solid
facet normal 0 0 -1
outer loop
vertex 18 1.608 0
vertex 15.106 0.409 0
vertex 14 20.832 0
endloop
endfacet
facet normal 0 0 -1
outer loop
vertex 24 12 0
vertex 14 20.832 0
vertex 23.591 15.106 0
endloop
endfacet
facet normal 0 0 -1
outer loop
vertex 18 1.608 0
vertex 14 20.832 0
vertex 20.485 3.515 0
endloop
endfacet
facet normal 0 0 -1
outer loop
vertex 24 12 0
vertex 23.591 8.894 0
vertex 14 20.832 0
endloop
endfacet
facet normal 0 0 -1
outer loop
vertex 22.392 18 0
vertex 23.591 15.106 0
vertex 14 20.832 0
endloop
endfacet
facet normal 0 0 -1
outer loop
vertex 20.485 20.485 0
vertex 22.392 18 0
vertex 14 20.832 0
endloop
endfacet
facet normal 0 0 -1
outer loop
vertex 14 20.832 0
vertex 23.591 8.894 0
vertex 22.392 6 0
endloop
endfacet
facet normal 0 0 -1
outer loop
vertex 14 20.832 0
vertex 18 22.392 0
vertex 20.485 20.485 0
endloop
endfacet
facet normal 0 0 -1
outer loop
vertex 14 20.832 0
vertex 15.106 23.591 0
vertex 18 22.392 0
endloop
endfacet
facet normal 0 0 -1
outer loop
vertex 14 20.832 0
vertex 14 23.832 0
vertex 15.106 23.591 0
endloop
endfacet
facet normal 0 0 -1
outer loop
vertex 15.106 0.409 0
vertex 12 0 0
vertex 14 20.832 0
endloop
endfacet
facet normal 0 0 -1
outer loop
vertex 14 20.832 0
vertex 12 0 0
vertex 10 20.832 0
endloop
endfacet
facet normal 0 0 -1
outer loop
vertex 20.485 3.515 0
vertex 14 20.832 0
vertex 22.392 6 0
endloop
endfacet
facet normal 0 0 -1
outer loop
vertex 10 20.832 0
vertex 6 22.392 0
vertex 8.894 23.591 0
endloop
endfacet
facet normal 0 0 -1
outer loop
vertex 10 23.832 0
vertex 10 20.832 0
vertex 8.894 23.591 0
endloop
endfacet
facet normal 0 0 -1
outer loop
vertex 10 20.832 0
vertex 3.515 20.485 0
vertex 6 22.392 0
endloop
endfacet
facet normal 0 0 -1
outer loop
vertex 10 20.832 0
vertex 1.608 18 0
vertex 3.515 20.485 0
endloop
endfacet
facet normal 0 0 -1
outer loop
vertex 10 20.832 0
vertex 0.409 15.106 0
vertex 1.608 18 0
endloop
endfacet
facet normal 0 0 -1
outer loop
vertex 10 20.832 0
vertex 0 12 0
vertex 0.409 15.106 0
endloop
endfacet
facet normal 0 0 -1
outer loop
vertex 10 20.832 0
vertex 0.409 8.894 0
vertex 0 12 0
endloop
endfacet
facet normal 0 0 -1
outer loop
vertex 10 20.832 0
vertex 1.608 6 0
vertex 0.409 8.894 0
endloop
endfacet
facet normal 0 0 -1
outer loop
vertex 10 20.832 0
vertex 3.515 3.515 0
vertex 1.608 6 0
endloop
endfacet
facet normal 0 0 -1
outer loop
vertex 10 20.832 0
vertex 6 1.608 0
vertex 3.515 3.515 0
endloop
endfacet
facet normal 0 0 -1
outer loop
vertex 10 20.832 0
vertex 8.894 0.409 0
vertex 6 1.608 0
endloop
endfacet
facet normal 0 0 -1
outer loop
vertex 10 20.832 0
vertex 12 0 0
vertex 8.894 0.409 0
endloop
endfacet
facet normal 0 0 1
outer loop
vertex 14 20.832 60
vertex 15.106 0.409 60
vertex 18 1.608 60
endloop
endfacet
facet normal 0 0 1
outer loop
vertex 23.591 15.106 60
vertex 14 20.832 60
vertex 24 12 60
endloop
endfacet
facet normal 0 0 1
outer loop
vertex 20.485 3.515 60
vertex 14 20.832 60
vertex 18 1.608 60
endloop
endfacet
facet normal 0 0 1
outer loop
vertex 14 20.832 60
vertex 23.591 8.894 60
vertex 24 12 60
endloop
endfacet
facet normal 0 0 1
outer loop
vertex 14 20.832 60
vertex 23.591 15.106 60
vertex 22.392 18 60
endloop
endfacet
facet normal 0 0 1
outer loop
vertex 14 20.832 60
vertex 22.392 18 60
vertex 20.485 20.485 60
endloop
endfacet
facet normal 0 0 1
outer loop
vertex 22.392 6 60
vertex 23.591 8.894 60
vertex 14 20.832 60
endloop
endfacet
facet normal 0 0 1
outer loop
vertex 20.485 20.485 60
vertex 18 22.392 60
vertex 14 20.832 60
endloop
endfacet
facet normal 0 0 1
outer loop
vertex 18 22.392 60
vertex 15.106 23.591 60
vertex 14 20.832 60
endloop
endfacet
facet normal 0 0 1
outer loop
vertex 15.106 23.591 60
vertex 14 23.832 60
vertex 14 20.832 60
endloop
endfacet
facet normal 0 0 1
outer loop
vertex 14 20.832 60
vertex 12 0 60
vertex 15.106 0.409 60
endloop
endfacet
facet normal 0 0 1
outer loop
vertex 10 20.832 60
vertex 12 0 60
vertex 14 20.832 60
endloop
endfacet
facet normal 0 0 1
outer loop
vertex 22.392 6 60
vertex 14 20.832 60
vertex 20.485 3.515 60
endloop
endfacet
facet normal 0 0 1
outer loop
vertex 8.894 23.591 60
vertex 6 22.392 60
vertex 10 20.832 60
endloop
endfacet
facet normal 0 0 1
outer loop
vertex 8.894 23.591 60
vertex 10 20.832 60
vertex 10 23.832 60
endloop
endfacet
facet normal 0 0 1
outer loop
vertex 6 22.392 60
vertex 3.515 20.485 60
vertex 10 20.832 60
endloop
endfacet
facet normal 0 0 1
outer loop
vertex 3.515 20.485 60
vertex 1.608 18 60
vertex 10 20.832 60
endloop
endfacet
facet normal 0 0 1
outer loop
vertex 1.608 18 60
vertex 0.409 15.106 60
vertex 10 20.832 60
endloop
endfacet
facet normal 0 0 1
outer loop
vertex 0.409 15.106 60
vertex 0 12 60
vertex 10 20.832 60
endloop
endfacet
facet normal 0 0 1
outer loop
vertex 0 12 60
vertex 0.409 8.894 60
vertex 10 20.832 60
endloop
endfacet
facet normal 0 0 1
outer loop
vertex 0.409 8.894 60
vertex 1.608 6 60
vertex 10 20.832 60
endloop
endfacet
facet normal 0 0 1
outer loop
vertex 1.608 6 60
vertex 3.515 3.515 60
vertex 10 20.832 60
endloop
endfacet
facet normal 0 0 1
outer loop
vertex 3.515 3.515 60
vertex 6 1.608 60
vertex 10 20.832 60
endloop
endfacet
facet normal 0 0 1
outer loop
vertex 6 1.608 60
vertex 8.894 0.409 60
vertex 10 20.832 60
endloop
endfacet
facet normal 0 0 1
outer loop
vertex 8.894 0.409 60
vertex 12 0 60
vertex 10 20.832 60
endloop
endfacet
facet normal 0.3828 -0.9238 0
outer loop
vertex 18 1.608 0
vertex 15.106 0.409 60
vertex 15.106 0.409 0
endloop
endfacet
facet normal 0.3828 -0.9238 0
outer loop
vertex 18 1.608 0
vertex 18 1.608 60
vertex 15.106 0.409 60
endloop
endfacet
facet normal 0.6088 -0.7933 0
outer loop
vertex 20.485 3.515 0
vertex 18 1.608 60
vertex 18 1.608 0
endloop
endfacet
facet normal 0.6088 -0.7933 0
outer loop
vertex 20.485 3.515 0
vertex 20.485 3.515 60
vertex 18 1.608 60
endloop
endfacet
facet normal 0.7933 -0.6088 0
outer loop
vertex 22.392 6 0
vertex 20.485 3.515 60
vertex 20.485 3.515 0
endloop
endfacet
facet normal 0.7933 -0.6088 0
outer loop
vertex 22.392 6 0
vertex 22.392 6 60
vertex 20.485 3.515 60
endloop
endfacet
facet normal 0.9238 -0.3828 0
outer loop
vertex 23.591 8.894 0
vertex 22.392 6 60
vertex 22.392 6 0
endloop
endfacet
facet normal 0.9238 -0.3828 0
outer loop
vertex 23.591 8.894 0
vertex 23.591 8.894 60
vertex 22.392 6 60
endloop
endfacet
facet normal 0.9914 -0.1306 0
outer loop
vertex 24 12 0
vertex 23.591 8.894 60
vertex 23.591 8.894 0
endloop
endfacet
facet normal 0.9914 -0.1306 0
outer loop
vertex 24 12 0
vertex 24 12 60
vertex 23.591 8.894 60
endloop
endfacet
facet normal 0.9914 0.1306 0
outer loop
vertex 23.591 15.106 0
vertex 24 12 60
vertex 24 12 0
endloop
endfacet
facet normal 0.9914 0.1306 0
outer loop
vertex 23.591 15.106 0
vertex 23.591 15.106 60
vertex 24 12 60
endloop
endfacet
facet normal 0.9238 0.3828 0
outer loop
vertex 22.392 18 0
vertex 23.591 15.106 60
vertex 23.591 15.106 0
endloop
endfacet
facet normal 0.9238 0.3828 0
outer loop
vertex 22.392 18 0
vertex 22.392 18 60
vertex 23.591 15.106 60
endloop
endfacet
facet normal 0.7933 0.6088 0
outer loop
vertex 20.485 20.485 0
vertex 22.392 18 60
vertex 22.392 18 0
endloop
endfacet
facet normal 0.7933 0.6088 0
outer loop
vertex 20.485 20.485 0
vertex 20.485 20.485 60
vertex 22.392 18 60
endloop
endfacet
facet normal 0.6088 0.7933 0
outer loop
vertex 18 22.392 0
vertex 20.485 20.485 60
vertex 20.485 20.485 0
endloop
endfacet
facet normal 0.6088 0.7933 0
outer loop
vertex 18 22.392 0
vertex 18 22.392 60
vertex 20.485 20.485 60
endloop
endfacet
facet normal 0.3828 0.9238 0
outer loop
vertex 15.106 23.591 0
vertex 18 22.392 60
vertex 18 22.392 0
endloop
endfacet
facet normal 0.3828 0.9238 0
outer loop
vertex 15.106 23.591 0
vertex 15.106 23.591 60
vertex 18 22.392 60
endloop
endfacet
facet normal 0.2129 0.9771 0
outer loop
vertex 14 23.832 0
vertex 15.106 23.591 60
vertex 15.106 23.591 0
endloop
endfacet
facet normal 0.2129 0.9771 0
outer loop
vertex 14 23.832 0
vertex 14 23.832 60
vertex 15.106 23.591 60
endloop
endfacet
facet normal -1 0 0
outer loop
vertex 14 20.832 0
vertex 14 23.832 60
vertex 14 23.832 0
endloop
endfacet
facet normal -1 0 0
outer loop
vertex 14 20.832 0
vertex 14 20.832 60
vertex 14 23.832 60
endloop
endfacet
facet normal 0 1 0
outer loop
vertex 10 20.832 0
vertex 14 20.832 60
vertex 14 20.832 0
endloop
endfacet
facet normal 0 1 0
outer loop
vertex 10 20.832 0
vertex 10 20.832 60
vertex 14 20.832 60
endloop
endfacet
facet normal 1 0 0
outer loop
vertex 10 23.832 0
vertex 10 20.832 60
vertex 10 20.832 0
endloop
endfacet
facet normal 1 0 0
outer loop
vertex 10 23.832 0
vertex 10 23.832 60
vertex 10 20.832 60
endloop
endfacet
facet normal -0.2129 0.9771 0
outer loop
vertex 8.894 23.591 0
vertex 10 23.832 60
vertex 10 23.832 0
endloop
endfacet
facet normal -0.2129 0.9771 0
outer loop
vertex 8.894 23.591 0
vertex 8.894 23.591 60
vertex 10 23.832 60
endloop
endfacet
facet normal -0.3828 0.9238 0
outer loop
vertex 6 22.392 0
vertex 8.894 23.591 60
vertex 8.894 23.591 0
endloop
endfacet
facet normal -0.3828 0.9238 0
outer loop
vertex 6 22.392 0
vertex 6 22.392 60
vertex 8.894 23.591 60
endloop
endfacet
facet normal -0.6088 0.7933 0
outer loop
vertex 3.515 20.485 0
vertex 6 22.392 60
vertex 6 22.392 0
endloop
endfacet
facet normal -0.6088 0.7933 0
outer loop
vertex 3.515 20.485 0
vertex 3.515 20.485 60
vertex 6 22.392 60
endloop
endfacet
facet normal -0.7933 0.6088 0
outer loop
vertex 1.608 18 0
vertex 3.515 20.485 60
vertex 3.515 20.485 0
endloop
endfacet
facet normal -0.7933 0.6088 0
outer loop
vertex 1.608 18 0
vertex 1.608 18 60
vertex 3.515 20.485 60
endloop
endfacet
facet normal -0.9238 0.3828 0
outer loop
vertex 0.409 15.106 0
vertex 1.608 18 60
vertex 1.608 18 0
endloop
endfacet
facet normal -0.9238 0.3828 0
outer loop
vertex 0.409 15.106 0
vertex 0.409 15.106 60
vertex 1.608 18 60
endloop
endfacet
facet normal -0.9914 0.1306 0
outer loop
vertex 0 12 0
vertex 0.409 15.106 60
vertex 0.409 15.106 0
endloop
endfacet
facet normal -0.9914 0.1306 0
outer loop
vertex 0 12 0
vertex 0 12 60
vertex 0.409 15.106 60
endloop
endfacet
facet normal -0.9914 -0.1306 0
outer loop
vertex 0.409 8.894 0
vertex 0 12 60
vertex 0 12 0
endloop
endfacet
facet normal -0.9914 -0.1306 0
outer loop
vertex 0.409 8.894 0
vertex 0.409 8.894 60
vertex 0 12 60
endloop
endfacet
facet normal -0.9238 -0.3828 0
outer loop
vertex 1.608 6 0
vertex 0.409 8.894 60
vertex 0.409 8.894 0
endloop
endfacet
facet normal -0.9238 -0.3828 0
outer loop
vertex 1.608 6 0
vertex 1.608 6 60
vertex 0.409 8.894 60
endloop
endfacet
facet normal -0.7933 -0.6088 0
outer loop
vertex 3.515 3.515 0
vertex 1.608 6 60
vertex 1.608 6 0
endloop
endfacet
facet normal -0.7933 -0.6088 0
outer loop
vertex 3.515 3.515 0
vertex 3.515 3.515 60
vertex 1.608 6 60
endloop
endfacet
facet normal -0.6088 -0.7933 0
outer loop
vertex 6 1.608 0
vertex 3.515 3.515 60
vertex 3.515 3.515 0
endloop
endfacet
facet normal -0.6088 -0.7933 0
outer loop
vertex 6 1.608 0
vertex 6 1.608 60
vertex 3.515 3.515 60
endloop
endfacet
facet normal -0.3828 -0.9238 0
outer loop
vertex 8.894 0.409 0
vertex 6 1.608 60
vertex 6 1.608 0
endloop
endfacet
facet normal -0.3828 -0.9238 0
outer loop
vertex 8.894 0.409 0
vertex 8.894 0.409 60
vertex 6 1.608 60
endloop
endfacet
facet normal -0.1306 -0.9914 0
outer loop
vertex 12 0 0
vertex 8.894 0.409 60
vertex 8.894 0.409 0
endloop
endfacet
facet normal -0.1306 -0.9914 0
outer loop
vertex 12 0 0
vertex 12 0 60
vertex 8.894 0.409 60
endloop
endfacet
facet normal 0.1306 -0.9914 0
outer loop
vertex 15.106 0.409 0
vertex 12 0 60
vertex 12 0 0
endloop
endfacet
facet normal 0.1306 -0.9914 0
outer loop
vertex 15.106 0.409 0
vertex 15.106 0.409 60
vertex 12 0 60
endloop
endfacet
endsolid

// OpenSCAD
$fn = 32;

// ----------------------------------------------------------------------
// Keyway shaft: d24 shaft, key 4 x 3 mm
// ----------------------------------------------------------------------

// --- parameters (mm) ---
shaft_r = 12;             // shaft radius
key_w = 4;                // keyway width
key_d = 3;                // keyway depth below the surface line
plate_t = 60;             // shaft length, Z (extrusion height)
fit_tol = 0.1;            // declared fit tolerance (prompt contract)
free_tol = 0.5;           // declared free tolerance (prompt contract)

shaft_d = 2 * shaft_r;  // shaft diameter
circle_step = 15;  // polygon sampling step, degrees

profile = [[8.894, 23.591], [6, 22.392], [3.515, 20.485], [1.608, 18], [0.409, 15.106], [0, 12], [0.409, 8.894], [1.608, 6], [3.515, 3.515], [6, 1.608], [8.894, 0.409], [12, 0], [15.106, 0.409], [18, 1.608], [20.485, 3.515], [22.392, 6], [23.591, 8.894], [24, 12], [23.591, 15.106], [22.392, 18], [20.485, 20.485], [18, 22.392], [15.106, 23.591], [14, 23.832], [14, 20.832], [10, 20.832], [10, 23.832]];  // primary outline, 27 points, counter clockwise

// --- the one profile operation ---
linear_extrude(height = plate_t) polygon(points = profile);
